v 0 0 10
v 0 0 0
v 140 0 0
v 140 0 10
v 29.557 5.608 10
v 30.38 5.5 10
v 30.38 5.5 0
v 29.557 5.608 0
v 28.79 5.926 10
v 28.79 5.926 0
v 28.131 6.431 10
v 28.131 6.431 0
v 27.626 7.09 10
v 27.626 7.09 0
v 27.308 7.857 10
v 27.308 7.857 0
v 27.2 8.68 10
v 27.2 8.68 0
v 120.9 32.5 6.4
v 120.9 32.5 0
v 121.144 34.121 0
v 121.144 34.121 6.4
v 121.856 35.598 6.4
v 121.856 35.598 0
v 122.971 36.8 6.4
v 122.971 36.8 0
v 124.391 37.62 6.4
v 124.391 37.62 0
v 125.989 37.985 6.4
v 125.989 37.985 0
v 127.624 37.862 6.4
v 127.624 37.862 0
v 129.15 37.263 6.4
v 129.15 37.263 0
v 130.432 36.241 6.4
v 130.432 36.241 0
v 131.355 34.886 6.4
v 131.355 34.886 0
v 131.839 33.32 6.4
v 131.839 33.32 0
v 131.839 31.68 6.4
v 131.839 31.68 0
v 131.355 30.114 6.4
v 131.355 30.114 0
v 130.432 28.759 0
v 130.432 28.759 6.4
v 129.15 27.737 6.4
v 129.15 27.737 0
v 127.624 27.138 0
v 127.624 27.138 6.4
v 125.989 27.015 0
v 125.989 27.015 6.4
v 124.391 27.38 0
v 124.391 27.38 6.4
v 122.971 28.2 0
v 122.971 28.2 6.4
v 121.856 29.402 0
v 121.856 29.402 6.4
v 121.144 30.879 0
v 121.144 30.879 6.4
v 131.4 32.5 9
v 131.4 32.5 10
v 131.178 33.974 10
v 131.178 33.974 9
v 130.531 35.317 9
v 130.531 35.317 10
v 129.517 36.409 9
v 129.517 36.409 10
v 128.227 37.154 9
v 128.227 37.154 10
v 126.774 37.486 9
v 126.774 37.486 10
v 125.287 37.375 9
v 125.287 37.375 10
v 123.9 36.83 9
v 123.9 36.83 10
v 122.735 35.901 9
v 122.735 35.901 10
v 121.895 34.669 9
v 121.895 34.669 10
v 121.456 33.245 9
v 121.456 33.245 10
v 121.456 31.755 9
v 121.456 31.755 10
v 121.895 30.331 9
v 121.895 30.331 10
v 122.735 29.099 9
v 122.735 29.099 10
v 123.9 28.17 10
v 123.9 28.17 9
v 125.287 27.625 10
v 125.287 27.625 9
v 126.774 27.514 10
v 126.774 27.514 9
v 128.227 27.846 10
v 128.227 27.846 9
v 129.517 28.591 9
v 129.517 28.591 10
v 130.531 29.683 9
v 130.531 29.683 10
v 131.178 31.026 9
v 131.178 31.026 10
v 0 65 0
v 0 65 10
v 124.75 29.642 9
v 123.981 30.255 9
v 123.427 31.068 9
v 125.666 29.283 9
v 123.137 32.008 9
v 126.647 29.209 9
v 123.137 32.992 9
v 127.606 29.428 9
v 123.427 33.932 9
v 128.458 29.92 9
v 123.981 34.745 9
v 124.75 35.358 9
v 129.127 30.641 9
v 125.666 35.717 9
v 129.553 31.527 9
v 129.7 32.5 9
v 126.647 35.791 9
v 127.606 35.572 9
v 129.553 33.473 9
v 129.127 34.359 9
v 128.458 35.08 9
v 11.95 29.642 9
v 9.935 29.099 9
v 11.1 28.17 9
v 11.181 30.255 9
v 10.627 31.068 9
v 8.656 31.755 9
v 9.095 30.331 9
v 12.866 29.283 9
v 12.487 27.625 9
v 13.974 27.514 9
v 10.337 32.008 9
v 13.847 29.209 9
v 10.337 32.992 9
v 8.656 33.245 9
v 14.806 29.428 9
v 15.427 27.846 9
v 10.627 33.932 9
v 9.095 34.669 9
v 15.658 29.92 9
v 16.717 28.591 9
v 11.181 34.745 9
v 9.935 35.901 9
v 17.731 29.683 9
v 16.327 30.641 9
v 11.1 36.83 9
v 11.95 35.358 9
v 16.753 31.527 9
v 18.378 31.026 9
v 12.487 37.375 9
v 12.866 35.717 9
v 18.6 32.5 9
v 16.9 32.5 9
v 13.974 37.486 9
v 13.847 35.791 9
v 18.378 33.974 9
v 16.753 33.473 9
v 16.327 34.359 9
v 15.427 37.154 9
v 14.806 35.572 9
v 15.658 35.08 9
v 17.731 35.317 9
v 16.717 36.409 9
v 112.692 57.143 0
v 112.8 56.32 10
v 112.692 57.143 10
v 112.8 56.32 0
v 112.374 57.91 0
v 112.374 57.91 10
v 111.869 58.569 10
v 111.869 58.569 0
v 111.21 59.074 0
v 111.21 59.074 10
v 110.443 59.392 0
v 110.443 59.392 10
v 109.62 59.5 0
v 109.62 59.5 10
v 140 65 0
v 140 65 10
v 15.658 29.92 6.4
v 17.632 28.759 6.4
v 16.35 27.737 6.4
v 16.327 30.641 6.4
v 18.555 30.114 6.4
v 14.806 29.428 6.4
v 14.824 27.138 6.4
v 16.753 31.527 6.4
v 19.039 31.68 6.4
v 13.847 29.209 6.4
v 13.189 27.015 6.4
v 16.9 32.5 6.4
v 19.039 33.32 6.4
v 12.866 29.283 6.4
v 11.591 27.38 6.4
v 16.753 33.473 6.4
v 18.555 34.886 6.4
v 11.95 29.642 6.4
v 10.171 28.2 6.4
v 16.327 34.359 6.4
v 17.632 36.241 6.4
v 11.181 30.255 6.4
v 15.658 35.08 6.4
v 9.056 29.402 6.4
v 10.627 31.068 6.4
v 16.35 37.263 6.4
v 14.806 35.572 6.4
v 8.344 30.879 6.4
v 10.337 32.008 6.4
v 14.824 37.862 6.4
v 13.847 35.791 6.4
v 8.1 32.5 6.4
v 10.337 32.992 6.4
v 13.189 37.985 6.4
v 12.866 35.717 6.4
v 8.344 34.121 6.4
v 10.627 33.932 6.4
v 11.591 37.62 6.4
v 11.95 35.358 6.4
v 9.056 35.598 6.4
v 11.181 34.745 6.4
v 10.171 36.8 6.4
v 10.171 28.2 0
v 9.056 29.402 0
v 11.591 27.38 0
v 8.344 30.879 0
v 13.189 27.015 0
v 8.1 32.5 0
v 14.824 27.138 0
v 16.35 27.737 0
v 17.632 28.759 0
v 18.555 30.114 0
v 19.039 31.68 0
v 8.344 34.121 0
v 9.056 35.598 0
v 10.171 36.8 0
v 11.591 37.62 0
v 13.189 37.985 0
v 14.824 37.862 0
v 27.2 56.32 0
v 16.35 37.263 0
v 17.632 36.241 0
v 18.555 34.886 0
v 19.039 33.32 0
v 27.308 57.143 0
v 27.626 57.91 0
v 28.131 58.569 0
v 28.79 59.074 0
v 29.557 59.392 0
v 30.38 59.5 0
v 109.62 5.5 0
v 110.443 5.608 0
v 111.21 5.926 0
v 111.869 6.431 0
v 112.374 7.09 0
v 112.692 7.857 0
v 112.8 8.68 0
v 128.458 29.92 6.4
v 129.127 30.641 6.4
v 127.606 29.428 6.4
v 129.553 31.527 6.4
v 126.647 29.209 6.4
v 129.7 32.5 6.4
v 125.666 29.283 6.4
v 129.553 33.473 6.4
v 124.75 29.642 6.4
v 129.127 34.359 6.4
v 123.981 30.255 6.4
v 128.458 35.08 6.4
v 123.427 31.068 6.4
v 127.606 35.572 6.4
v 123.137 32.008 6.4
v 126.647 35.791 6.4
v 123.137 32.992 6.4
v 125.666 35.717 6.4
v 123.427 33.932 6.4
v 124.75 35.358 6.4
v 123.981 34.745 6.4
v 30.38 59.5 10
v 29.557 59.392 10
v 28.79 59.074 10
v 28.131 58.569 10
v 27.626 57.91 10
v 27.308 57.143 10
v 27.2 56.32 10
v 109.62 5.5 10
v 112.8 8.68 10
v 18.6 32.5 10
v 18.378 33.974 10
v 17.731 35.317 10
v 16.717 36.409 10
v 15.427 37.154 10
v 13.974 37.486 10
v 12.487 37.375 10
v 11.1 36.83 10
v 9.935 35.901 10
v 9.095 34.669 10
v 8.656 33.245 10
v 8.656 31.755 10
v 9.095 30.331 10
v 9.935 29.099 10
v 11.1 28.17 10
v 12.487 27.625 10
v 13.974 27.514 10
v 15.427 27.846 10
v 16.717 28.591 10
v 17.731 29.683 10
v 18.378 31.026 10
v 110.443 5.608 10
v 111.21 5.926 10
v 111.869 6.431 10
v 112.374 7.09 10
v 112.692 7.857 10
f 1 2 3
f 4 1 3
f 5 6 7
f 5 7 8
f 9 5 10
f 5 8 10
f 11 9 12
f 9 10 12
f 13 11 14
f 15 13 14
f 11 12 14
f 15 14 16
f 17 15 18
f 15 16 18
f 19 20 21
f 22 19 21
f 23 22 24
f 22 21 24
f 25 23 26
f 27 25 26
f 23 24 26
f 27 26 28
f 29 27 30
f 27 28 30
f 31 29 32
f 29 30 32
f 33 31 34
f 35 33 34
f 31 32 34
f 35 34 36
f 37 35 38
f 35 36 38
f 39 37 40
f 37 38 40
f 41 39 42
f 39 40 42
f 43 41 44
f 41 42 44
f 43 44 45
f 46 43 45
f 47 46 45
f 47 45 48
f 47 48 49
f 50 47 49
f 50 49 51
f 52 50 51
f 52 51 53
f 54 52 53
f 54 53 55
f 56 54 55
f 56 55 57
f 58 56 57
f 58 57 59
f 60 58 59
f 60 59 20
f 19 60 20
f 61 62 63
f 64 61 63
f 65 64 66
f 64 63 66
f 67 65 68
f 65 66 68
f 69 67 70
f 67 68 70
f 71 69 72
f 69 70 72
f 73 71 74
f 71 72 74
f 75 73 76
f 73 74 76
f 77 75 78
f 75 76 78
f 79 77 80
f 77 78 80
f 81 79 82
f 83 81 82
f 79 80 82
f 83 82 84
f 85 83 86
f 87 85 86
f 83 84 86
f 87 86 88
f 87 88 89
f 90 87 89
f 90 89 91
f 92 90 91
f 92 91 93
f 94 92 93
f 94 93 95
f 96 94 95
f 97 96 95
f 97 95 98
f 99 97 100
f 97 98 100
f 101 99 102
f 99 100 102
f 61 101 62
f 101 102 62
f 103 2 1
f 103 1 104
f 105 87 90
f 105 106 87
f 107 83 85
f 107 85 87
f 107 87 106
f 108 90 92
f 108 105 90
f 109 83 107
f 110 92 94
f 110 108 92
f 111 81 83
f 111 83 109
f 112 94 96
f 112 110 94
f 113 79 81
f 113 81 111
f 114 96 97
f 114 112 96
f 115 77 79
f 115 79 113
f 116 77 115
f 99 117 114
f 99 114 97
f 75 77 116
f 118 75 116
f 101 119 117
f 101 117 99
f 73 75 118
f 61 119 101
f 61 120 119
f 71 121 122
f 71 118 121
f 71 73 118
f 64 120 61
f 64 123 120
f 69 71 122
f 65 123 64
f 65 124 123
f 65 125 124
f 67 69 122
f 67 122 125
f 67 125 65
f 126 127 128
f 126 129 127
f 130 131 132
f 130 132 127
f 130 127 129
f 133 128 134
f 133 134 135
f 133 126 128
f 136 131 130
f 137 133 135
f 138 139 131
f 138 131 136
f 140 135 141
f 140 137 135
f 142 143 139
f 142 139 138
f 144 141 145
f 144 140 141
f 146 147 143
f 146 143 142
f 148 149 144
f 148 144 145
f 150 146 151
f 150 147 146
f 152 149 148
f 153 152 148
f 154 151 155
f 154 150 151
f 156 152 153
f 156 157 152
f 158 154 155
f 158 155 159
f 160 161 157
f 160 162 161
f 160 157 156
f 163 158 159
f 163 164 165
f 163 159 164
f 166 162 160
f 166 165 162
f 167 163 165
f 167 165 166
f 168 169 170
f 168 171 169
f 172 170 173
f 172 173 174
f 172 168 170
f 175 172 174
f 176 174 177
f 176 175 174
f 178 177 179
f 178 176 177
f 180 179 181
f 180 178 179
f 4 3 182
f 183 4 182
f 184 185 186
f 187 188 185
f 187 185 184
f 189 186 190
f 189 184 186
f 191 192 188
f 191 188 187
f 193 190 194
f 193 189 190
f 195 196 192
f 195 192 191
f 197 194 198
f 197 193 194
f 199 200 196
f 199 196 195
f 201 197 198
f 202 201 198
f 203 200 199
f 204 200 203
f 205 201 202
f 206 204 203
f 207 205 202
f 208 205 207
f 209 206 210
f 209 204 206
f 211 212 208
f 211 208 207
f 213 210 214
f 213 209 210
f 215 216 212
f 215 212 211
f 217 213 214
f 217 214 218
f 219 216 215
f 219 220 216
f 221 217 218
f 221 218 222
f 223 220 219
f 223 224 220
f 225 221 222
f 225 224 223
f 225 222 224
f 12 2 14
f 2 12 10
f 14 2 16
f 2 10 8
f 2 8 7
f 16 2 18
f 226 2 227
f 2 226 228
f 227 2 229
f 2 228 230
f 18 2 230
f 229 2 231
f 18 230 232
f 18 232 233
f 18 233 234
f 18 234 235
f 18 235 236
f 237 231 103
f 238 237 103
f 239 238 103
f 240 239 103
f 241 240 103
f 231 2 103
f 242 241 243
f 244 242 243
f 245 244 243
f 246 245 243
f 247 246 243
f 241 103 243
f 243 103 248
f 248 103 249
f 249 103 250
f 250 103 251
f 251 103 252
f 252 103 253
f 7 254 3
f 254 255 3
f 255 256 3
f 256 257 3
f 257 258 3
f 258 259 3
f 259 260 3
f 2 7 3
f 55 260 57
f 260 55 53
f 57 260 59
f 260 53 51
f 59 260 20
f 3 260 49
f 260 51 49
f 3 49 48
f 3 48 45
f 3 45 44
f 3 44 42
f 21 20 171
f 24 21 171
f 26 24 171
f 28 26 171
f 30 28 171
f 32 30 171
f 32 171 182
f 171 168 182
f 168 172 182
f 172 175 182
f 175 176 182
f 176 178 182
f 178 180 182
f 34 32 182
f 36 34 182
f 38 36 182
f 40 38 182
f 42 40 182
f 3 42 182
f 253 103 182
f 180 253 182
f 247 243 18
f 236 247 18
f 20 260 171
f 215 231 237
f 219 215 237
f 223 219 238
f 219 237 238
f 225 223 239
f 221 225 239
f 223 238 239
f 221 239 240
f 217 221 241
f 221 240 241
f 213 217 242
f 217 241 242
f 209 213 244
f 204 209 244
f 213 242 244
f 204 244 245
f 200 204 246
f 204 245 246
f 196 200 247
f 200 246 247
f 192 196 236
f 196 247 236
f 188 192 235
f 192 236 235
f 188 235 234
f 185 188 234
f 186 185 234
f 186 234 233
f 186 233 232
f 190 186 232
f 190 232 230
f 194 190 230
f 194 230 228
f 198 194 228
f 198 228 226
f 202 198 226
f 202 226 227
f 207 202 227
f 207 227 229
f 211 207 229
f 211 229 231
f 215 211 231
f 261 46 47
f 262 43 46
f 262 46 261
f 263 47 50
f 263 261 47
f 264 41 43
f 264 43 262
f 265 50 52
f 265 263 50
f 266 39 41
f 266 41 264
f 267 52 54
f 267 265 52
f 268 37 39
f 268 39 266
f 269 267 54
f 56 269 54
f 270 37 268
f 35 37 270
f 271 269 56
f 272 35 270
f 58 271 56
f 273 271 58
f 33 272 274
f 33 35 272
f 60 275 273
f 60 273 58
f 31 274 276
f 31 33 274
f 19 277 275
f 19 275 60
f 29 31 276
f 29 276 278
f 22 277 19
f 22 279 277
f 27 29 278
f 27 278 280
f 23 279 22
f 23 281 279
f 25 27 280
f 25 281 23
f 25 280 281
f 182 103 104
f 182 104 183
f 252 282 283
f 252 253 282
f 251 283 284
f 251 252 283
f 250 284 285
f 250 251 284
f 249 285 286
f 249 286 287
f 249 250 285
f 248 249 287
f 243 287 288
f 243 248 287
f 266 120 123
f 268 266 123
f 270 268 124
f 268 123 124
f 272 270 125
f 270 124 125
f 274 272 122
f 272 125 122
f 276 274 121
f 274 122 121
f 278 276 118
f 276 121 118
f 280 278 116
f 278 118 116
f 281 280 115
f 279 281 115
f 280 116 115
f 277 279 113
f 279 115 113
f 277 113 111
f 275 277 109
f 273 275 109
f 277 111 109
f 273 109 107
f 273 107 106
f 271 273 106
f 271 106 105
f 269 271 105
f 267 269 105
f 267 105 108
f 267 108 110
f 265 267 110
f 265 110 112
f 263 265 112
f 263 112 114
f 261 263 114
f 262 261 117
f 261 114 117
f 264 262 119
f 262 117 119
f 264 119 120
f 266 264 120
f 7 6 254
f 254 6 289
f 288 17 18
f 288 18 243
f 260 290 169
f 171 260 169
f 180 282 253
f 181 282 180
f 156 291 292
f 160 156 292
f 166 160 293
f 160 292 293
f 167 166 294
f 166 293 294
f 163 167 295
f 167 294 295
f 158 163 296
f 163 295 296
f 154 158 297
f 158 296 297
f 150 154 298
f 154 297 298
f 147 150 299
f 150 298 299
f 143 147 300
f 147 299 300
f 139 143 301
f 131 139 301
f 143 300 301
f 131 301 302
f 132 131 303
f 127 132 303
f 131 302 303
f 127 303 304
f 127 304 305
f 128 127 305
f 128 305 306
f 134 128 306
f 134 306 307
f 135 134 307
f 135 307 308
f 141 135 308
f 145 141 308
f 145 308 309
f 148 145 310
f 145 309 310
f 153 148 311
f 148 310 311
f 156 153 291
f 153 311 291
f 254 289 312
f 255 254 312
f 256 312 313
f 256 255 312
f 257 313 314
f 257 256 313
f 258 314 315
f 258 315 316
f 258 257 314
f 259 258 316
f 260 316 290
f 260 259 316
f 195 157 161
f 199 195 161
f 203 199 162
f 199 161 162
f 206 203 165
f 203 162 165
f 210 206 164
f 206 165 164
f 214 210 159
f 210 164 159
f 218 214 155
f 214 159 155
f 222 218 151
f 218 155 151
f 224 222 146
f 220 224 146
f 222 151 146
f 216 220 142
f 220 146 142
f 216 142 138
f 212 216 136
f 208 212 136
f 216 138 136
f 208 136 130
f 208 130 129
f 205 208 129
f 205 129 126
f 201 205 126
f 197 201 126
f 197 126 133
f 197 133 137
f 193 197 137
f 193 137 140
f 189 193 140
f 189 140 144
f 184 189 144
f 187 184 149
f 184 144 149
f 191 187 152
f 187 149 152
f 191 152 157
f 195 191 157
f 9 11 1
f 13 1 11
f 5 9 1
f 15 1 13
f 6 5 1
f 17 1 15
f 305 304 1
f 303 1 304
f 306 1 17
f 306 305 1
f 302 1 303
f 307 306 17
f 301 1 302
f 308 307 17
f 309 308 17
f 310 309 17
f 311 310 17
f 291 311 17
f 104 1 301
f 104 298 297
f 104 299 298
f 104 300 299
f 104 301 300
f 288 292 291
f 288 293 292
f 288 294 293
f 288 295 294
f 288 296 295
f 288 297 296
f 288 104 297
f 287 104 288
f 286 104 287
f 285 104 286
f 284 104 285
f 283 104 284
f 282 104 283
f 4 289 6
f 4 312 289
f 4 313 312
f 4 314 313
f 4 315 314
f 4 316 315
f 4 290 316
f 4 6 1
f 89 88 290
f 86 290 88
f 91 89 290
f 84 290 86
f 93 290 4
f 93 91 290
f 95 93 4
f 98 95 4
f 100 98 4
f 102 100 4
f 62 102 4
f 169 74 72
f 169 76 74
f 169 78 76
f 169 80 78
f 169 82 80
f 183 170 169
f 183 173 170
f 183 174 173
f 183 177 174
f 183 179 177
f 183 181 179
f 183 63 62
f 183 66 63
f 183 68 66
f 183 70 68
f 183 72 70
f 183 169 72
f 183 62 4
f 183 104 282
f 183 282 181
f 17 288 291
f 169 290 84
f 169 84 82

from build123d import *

# Parameters (mm, degrees)
SKETCH_1_W                   = 140
SKETCH_1_H                   = 65
EXTRUDE_1_DEPTH              = 10
SKETCH_2_W                   = 85.6
SKETCH_2_H                   = 54
CUT_EXTRUDE_1_DEPTH          = 11
FILLET_1_R                   = 3.18
HOLE_WIZARD_M6_1_D           = 6.6
HOLE_WIZARD_M6_1_DEPTH       = 15
HOLE_WIZARD_M6_1_CBORE_D     = 11
HOLE_WIZARD_M6_1_CBORE_DEPTH = 6.4
HOLE_WIZARD_M6_1_TIP         = 1.982840043
SKETCH_6_R                   = 5
CUT_EXTRUDE_3_DEPTH          = 1


with BuildPart() as part:
    # 草图1 → 凸台-拉伸1 (new body)
    with BuildSketch(Plane.XY):
        with Locations((70, 32.5)):
            Rectangle(SKETCH_1_W, SKETCH_1_H)
    extrude(amount=EXTRUDE_1_DEPTH)

    # 草图2 → 切除-拉伸1 (cut, through all)
    with BuildSketch(Plane.XY.offset(10)):
        with Locations((70, 32.5)):
            Rectangle(SKETCH_2_W, SKETCH_2_H)
    extrude(amount=-CUT_EXTRUDE_1_DEPTH, mode=Mode.SUBTRACT)

    # 圆角1
    fillet_1_edges = [part.edges().sort_by_distance(p)[0] for p in [
        (27.2, 5.5, 5),
        (27.2, 59.5, 5),
        (112.8, 59.5, 5),
        (112.8, 5.5, 5),
    ]]
    fillet(fillet_1_edges, radius=FILLET_1_R)

    # M6 六角凹头螺钉的柱形沉头孔1
    with Locations(Plane(origin=(0, 0, 0), x_dir=(-1, 0, 0), z_dir=(0, 0, -1))):
        with Locations((-126.4, 32.5), (-13.6, 32.5)):
            CounterBoreHole(HOLE_WIZARD_M6_1_D / 2, HOLE_WIZARD_M6_1_CBORE_D / 2, HOLE_WIZARD_M6_1_CBORE_DEPTH, depth=HOLE_WIZARD_M6_1_DEPTH)
            with Locations((0, 0, -(HOLE_WIZARD_M6_1_DEPTH + HOLE_WIZARD_M6_1_TIP / 2))):  # 118° drill point
                Cone(0, HOLE_WIZARD_M6_1_D / 2, HOLE_WIZARD_M6_1_TIP, mode=Mode.SUBTRACT)

    # 草图6 → 切除-拉伸3 (cut)
    with BuildSketch(Plane.XY.offset(10)):
        with Locations((13.6, 32.5)):
            Circle(SKETCH_6_R)
        with Locations((126.4, 32.5)):
            Circle(SKETCH_6_R)
    extrude(amount=-CUT_EXTRUDE_3_DEPTH, mode=Mode.SUBTRACT)


solid = part.part
